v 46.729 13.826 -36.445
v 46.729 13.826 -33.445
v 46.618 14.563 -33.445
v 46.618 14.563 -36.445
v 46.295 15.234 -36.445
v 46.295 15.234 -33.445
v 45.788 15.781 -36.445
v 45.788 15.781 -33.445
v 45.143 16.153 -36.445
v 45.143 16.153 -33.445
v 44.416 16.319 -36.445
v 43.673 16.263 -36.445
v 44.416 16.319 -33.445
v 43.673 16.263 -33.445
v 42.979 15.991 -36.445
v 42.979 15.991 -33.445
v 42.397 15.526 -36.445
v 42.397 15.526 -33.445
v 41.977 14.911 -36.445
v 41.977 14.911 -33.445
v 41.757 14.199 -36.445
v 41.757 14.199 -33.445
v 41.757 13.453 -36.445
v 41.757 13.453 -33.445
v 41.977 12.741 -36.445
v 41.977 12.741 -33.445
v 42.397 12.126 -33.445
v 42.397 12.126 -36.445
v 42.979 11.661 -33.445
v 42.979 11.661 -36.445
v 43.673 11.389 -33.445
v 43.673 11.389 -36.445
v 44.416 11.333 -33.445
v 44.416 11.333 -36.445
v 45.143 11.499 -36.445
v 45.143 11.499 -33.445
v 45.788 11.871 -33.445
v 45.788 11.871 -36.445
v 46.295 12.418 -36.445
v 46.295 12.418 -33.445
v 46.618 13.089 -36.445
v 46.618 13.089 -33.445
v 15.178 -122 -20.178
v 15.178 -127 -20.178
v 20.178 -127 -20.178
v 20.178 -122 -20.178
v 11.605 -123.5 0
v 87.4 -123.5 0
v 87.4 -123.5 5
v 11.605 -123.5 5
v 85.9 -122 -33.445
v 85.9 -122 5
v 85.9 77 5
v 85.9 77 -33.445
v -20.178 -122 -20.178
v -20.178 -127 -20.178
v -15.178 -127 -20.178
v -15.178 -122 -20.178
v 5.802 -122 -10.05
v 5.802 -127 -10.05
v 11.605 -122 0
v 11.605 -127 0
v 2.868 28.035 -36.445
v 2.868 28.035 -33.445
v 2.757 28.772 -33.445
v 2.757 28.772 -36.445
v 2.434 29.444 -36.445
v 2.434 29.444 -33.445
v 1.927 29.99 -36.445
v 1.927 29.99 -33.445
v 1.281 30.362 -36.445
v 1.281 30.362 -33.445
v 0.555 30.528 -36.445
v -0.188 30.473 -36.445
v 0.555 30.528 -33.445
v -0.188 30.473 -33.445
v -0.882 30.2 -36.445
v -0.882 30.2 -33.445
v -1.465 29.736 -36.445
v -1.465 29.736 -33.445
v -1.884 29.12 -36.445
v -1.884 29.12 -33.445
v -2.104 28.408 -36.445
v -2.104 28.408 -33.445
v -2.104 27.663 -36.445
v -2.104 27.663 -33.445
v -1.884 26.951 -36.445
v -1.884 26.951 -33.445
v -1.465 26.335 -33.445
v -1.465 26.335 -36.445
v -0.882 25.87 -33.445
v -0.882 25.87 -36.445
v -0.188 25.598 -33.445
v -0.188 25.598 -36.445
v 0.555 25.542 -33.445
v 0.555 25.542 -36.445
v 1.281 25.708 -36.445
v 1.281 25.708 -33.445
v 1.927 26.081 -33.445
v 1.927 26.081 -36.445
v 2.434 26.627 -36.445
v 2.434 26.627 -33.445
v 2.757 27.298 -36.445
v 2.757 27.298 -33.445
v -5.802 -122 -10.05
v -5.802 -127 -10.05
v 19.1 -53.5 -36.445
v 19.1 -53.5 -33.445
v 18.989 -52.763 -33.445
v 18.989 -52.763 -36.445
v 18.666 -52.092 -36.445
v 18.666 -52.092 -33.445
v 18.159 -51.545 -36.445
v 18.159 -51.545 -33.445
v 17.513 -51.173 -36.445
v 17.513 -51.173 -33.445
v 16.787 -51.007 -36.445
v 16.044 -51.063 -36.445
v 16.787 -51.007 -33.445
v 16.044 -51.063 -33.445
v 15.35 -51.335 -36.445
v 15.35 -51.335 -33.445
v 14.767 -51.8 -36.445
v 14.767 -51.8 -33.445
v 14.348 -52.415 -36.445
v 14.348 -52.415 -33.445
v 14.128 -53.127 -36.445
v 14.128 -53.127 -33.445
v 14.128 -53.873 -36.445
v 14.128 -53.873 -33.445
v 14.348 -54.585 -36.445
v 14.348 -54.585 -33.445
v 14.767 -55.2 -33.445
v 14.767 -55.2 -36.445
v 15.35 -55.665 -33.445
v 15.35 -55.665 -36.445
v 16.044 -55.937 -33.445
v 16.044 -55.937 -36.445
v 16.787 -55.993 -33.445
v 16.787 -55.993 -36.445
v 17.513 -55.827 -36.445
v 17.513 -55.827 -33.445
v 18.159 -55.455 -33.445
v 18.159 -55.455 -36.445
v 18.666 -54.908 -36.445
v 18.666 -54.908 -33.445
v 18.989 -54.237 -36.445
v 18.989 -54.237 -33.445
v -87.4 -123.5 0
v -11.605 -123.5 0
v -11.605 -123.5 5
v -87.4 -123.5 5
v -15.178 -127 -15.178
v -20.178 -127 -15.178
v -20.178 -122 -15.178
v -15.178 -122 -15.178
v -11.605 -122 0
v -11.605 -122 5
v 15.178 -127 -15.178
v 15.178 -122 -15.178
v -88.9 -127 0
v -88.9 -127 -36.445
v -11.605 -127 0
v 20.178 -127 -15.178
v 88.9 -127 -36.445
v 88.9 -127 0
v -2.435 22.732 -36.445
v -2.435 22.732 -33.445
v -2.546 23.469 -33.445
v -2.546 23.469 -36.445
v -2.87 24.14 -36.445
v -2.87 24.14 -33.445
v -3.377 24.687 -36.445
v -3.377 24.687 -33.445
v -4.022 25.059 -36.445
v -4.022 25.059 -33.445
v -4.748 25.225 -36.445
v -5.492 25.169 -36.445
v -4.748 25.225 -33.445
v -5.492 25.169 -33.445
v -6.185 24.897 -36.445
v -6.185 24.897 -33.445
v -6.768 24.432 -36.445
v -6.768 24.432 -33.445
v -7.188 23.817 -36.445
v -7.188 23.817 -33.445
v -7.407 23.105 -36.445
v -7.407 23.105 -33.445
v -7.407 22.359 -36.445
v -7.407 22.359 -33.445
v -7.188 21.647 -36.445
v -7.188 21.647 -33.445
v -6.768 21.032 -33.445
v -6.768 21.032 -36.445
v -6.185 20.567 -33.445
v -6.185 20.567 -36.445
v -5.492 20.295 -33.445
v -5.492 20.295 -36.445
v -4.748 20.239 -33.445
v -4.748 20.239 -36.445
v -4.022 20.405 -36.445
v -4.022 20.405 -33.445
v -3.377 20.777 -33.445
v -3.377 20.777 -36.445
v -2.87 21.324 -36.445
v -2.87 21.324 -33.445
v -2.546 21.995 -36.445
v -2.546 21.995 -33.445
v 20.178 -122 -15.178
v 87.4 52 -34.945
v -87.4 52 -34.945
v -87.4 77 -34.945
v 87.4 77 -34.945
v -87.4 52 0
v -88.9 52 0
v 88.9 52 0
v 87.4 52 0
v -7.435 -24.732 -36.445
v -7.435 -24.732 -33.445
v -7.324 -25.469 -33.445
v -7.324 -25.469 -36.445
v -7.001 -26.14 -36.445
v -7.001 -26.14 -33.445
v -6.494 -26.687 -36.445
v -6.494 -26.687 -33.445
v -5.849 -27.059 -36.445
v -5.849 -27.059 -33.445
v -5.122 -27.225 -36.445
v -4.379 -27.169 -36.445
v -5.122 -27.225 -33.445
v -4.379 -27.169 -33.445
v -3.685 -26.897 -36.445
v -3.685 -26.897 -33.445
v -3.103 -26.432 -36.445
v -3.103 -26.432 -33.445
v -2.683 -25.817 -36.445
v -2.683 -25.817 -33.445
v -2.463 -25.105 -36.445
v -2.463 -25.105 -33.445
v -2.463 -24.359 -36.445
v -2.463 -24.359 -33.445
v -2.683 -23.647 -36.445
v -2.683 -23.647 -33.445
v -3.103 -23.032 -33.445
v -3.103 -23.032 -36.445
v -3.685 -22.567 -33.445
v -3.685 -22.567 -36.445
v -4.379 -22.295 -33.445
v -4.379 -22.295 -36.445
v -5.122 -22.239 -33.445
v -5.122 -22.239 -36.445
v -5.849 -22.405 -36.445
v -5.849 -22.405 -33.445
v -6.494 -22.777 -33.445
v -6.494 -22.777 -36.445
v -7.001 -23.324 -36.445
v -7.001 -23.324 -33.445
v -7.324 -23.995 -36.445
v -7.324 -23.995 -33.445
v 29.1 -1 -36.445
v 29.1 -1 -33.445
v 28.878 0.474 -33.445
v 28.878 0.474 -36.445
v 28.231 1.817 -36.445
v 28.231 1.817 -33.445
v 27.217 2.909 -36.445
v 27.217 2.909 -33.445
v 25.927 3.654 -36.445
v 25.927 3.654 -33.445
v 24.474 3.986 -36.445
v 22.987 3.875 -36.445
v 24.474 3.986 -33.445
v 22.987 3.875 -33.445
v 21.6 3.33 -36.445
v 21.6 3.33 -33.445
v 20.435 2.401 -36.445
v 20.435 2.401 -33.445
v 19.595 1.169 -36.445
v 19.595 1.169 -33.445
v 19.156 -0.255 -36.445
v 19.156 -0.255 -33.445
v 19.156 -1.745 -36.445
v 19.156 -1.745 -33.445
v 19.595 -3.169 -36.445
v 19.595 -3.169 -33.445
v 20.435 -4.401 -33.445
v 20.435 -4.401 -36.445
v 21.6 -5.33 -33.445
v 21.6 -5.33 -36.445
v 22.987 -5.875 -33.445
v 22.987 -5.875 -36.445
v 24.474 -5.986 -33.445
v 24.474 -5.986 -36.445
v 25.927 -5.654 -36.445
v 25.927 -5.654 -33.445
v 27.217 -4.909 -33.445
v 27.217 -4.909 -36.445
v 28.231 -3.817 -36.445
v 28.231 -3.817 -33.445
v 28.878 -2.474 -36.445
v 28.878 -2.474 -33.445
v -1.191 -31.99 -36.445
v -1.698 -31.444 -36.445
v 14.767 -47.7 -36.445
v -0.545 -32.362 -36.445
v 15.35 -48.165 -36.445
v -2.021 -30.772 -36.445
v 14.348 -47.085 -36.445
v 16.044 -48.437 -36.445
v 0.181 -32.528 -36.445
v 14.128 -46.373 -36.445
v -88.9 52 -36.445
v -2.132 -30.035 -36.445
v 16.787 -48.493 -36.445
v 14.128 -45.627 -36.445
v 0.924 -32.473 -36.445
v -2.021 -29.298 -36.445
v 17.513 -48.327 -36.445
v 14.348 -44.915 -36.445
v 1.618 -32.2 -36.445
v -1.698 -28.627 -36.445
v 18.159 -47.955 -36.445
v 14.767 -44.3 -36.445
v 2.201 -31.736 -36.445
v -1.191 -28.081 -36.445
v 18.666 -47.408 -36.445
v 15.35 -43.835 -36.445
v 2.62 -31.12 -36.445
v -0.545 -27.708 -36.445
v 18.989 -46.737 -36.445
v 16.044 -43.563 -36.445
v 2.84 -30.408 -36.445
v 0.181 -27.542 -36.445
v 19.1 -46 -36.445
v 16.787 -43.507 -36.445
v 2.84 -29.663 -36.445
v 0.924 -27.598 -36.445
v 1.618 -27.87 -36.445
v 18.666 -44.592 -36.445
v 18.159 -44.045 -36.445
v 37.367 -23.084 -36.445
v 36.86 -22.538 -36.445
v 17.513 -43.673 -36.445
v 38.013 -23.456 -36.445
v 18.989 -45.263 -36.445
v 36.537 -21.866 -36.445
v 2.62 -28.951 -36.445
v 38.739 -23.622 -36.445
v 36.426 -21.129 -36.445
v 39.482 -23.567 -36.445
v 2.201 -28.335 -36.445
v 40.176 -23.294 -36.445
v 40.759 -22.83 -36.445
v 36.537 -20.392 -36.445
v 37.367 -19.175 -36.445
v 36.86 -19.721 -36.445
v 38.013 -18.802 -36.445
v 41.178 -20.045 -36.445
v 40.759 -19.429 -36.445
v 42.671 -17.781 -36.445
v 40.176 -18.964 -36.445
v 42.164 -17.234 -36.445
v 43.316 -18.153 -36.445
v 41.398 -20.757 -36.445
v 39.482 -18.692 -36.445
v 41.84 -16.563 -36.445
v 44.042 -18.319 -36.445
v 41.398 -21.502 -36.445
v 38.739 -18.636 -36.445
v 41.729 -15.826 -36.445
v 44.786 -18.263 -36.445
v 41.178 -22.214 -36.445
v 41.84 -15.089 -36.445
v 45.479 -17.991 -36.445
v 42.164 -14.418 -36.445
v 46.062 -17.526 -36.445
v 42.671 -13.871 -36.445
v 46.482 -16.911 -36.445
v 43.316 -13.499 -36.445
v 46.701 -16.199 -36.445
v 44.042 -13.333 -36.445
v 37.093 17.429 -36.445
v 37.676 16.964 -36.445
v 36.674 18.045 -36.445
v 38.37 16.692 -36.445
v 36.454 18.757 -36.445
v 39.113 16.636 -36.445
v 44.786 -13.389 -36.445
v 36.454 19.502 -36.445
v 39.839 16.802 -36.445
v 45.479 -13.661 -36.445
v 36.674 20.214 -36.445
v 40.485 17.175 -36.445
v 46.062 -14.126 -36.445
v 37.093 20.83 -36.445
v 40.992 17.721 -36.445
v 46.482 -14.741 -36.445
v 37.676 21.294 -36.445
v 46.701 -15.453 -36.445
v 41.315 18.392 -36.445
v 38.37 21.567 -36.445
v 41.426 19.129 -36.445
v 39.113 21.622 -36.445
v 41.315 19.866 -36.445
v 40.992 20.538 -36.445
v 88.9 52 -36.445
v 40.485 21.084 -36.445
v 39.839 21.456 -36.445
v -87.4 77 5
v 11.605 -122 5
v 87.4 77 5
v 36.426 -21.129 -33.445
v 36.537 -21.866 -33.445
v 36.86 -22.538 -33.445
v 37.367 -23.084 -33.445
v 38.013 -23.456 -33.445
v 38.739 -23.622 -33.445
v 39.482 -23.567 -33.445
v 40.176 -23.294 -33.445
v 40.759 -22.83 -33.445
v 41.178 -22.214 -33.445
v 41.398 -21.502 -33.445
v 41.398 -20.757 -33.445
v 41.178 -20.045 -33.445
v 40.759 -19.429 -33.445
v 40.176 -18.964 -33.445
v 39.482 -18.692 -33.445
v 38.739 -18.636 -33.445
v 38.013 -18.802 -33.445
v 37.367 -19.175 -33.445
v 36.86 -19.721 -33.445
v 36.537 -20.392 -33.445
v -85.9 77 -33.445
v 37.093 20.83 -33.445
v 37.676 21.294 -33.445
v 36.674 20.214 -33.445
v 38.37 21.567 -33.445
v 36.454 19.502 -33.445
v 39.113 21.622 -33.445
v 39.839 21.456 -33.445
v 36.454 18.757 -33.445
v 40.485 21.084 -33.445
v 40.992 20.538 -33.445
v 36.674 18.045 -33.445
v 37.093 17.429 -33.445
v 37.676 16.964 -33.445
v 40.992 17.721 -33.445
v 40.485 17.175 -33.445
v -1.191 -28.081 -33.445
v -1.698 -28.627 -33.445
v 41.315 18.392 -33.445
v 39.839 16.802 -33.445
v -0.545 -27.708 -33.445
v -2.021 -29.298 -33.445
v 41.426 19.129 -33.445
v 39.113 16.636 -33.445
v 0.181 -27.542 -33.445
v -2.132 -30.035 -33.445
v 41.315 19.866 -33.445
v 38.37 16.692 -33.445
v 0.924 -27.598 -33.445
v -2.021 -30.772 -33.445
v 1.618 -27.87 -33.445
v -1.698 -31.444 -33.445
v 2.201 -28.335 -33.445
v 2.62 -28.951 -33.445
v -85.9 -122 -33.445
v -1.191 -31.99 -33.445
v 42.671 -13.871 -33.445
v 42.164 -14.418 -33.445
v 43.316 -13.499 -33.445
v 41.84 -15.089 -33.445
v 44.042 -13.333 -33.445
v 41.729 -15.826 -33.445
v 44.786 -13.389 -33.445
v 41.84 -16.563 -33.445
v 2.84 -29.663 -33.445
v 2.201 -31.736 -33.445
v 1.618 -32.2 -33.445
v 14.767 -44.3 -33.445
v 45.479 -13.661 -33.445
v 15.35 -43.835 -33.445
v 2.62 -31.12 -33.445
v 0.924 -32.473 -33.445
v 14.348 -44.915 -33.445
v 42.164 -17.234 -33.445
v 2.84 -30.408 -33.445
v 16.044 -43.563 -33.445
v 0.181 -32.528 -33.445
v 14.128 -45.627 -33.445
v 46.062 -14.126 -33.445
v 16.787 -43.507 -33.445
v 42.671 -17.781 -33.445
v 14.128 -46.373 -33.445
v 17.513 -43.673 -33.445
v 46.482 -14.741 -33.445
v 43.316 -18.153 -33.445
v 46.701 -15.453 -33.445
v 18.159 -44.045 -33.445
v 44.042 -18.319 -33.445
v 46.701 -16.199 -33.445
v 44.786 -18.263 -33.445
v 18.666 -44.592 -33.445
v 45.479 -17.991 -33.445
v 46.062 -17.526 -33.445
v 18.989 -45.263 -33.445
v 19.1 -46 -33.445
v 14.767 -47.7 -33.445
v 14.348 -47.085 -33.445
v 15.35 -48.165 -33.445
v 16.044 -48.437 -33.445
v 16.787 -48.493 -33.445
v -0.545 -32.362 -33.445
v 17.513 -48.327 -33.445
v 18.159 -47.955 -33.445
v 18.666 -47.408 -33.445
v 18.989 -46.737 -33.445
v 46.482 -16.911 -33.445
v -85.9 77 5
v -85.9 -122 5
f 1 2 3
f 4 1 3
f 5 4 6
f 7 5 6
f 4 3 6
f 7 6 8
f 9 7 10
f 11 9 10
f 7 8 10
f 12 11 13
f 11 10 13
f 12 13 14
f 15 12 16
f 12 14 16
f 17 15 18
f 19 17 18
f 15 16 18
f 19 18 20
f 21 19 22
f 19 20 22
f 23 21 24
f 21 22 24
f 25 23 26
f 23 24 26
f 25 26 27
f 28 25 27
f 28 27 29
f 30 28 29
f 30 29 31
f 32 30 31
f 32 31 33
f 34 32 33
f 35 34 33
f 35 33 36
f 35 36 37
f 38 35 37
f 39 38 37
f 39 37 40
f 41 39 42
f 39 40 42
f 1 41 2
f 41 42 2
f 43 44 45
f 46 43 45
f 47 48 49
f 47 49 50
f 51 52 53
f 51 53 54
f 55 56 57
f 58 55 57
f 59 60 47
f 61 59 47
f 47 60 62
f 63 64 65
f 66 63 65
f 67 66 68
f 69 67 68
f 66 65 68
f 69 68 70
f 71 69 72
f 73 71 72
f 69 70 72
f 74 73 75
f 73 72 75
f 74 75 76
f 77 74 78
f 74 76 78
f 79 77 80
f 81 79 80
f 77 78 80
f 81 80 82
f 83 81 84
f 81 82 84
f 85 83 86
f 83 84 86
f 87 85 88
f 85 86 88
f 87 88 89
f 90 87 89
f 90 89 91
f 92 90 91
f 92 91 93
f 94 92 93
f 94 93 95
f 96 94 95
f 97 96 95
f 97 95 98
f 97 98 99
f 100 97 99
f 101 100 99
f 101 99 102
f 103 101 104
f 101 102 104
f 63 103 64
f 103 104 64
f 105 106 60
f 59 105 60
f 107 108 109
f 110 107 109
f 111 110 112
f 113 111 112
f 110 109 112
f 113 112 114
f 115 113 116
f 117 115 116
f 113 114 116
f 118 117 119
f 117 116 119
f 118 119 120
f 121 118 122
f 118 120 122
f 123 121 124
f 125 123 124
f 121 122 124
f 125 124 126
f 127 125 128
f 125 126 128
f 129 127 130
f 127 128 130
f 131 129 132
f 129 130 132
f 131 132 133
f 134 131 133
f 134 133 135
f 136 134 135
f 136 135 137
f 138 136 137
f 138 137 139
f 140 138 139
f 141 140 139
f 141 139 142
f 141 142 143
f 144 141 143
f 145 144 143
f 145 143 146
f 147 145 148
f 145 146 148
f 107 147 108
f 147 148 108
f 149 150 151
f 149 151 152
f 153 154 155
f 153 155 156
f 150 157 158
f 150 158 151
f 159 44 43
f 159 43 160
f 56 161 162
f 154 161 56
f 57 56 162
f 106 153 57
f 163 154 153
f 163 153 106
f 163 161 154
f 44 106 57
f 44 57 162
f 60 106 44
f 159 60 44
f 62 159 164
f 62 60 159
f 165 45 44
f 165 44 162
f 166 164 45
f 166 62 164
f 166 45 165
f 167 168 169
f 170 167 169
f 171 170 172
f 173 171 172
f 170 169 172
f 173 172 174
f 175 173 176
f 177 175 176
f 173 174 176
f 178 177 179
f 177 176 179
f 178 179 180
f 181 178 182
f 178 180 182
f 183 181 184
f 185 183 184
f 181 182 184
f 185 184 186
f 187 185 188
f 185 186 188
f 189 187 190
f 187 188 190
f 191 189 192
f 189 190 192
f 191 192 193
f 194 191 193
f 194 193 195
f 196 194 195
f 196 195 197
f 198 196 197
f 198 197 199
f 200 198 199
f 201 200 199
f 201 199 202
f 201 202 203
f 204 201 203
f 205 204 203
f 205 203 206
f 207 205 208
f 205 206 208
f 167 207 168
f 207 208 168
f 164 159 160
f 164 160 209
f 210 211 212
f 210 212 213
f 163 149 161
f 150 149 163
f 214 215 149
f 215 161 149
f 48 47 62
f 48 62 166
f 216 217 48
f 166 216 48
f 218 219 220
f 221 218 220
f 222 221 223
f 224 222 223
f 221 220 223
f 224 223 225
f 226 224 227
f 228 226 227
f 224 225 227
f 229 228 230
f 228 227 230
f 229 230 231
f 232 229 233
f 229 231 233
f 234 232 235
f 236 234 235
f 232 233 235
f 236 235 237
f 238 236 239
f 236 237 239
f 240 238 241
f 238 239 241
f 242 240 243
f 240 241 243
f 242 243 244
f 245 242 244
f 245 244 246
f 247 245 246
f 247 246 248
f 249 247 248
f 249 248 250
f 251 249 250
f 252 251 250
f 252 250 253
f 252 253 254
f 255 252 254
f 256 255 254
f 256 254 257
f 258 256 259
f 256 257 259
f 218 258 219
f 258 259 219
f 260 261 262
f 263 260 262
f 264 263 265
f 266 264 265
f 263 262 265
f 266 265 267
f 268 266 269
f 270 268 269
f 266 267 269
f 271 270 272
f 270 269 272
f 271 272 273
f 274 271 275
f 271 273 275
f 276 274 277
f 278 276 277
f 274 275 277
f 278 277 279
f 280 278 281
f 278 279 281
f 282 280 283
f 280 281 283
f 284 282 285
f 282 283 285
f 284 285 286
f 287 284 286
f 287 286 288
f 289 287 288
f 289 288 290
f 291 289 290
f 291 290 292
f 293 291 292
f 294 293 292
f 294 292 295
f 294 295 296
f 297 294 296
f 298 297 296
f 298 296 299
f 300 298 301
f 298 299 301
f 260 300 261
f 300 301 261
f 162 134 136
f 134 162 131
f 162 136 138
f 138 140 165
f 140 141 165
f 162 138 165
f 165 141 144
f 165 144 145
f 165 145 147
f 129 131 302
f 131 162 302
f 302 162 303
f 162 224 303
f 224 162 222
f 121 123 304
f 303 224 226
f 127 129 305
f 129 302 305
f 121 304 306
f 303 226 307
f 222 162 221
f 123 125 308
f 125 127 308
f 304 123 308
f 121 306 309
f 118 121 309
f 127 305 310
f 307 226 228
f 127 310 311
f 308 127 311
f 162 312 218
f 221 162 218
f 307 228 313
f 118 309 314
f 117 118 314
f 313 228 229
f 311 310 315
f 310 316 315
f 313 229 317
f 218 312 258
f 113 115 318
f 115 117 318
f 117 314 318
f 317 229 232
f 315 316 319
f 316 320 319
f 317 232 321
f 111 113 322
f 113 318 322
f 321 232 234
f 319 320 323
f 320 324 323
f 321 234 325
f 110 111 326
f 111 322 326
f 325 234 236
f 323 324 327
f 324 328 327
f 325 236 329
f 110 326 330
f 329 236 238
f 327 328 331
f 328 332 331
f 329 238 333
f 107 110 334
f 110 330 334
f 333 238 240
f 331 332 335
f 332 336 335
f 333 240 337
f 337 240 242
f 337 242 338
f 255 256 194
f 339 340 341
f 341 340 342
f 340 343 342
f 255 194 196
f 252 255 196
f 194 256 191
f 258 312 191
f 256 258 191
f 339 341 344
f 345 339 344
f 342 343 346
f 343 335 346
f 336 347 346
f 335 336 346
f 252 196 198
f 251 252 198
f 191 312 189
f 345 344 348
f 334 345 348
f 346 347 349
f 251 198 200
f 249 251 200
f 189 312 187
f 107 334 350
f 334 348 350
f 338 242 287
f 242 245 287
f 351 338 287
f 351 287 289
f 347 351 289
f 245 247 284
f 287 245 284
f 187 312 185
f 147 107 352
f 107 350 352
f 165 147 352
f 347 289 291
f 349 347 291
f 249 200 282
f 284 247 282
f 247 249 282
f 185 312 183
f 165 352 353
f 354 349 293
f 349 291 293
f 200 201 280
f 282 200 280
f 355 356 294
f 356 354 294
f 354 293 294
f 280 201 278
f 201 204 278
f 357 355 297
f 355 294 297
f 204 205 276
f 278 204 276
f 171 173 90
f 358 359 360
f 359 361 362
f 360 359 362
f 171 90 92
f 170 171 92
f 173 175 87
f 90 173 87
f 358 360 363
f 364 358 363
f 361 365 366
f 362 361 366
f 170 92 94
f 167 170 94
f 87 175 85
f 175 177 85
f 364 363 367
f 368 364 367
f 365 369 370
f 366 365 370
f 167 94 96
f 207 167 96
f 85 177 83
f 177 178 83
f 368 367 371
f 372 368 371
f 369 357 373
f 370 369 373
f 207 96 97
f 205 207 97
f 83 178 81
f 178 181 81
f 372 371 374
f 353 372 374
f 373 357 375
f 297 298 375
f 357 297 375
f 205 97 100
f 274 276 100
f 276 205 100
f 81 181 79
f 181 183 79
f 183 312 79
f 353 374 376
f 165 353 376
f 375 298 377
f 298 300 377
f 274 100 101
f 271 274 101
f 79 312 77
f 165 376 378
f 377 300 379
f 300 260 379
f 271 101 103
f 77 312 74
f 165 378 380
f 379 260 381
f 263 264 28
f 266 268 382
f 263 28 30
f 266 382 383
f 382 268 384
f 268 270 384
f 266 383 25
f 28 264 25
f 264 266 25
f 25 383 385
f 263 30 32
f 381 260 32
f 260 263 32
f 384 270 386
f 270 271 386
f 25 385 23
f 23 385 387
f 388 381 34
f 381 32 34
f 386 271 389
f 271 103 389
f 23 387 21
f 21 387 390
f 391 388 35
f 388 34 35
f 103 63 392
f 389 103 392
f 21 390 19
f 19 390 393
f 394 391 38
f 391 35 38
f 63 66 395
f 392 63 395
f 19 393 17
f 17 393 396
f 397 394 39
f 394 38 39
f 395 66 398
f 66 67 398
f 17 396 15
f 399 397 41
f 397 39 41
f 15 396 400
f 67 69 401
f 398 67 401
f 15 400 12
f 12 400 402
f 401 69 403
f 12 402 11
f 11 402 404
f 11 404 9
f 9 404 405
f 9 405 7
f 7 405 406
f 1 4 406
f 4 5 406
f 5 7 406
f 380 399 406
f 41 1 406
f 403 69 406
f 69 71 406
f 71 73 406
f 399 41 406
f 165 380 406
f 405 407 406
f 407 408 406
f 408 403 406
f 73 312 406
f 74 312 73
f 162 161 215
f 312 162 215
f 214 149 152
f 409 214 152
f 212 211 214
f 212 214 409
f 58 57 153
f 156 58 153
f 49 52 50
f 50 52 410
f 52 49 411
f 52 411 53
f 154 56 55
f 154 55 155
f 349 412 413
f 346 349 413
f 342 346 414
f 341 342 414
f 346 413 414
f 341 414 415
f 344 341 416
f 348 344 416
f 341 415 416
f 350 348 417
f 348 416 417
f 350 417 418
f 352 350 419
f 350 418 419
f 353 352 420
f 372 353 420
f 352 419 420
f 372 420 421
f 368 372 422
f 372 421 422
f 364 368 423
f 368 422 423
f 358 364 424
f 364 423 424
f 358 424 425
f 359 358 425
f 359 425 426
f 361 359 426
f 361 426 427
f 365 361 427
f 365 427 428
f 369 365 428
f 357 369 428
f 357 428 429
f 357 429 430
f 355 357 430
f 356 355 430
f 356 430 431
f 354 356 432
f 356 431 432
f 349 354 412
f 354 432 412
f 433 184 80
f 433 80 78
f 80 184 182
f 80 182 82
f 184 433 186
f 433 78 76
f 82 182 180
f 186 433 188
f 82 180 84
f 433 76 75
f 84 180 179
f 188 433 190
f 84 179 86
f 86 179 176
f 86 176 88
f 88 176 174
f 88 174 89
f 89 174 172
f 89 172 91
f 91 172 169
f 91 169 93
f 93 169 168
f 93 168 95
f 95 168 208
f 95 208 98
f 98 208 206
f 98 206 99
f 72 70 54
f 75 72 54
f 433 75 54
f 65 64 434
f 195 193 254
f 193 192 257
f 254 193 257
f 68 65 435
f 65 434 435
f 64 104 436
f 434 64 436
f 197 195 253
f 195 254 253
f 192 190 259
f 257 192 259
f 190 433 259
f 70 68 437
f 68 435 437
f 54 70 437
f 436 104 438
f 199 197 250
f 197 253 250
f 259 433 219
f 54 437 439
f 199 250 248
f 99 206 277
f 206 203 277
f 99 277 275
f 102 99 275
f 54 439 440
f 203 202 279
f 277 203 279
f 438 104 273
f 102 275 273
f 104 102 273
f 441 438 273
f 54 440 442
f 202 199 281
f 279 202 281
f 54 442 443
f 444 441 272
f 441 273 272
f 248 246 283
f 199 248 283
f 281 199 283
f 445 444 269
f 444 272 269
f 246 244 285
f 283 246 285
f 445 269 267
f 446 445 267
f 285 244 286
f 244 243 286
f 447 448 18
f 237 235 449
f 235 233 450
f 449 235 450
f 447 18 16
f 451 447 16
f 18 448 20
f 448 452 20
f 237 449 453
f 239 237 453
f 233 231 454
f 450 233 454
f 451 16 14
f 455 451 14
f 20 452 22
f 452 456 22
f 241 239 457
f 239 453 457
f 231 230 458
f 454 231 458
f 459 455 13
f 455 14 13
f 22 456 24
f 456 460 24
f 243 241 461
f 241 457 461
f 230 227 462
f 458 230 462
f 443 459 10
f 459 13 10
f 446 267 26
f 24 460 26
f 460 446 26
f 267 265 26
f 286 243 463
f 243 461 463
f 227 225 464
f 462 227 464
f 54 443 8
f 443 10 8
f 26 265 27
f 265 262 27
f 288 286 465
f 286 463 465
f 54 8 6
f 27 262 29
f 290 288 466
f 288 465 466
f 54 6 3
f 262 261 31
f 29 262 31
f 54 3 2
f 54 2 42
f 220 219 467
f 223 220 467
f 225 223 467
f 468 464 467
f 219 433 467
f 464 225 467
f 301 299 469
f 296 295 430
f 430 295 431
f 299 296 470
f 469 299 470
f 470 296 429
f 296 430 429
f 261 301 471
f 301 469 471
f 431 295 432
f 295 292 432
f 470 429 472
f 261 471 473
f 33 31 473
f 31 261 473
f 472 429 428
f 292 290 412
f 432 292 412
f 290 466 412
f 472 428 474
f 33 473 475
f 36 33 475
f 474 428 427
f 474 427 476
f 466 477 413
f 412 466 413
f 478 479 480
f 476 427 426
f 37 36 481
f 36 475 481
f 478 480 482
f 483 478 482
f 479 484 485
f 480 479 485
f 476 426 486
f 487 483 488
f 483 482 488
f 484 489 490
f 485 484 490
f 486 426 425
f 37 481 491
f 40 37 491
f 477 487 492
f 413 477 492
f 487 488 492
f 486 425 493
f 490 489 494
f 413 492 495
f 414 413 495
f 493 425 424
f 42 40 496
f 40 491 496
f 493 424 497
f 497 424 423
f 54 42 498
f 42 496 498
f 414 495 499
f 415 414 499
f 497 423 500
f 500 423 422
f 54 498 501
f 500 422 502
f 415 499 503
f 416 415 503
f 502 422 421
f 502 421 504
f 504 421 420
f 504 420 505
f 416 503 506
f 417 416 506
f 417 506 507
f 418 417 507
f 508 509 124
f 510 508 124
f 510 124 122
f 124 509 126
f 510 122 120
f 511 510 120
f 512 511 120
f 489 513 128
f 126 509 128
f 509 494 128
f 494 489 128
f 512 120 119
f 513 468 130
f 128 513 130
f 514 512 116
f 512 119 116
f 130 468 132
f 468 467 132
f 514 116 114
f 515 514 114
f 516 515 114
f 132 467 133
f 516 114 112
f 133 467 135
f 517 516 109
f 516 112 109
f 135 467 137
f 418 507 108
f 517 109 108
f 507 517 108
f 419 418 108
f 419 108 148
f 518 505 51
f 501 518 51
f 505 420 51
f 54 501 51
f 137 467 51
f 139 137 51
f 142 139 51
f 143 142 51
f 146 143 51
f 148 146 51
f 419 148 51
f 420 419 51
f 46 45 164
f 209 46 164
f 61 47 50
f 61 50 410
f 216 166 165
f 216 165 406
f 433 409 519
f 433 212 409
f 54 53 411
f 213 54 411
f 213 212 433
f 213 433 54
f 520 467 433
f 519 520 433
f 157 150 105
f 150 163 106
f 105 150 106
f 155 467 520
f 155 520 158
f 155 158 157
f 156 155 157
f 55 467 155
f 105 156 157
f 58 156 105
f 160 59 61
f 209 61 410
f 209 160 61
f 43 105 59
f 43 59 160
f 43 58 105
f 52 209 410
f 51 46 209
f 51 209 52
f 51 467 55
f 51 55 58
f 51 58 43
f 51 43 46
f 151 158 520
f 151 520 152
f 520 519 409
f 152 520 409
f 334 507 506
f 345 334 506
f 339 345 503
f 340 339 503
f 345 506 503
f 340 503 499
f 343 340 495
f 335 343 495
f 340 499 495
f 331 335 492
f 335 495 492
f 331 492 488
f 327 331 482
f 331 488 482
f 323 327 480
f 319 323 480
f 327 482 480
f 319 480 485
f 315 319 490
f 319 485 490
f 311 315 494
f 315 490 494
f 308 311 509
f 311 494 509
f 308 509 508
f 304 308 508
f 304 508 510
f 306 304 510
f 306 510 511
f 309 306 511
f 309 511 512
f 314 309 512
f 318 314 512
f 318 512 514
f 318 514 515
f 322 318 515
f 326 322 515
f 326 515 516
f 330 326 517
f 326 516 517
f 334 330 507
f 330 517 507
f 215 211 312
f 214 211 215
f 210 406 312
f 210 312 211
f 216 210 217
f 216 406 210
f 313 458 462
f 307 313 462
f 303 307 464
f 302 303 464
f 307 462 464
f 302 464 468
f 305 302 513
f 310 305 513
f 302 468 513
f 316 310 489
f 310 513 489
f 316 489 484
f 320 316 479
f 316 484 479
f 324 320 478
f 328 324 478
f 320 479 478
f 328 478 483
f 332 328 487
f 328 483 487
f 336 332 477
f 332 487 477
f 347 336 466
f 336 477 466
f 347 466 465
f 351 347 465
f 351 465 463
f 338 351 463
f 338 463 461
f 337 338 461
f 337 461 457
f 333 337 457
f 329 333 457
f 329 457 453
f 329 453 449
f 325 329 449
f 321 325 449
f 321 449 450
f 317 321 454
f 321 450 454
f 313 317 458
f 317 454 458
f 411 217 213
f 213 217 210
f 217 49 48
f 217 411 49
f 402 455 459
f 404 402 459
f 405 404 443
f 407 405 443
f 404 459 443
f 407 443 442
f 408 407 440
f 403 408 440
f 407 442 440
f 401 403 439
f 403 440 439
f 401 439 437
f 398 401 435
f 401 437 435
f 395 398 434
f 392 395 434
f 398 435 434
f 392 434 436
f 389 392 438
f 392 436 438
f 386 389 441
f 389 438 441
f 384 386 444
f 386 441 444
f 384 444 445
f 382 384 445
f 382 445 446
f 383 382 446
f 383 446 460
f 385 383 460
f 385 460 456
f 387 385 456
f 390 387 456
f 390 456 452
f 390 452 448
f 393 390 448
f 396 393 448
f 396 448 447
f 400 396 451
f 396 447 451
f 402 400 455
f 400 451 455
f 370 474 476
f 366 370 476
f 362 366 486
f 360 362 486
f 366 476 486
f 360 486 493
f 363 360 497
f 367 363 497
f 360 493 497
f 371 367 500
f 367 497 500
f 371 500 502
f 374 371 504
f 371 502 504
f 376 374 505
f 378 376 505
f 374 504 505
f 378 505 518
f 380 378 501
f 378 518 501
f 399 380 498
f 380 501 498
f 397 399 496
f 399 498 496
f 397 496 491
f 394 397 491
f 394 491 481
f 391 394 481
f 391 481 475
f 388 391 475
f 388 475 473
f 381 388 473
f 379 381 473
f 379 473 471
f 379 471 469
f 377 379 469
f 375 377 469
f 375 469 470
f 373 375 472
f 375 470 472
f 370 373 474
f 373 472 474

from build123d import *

# Parameters (mm, degrees)
SKETCH1_W           = 177.8
SKETCH1_H           = 254
BOSS_EXTRUDE1_DEPTH = 36.445
SHELL1_T            = 3
SKETCH2_R           = 22
CUT_EXTRUDE1_DEPTH  = 3
SKETCH3_R           = 5
SKETCH3_R_2         = 2.5
CUT_EXTRUDE2_DEPTH  = 3
SKETCH12_W          = 12
SKETCH12_H          = 66.89
BOSS_EXTRUDE5_DEPTH = 8
SKETCH10_R          = 3
CUT_EXTRUDE8_DEPTH  = 8
SKETCH13_W          = 174.8
SKETCH13_H          = 69.89
SKETCH13_W_2        = 171.8
SKETCH13_H_2        = 66.89
BOSS_EXTRUDE6_DEPTH = 25
SKETCH14_W          = 175.3
SKETCH14_H          = 70.39
SKETCH14_W_2        = 171.8
SKETCH14_H_2        = 66.89
CUT_EXTRUDE9_DEPTH  = 10
SKETCH17_W          = 171.8
SKETCH17_H          = 66.89
BOSS_EXTRUDE7_DEPTH = 2
SKETCH15_W          = 5
SKETCH15_H          = 5
CUT_EXTRUDE10_DEPTH = 5
BOSS_EXTRUDE8_DEPTH = 5


with BuildPart() as part:
    # Sketch1 → Boss-Extrude1 (new, symmetric)
    with BuildSketch(Plane.XY):
        Rectangle(SKETCH1_W, SKETCH1_H)
    extrude(amount=BOSS_EXTRUDE1_DEPTH, both=True)

    # Shell1 (no face opened: a closed hollow body)
    add(offset(amount=-SHELL1_T, mode=Mode.PRIVATE), mode=Mode.SUBTRACT)

    # Sketch2 → Cut-Extrude1 (cut)
    with BuildSketch(Plane(origin=(0, 0, 33.445), x_dir=(-1, 0, 0), z_dir=(0, 0, -1))):
        with Locations((0, -4)):
            Circle(SKETCH2_R)
    extrude(amount=-CUT_EXTRUDE1_DEPTH, mode=Mode.SUBTRACT)

    # Sketch3 → Cut-Extrude2 (cut)
    with BuildSketch(Plane.XY.offset(-33.445)):
        with Locations((24.1, -1)):
            Circle(SKETCH3_R)
        with Locations((44.229314747, 13.826013888)):
            Circle(SKETCH3_R_2)
        with Locations((38.926013888, 19.129314747)):
            Circle(SKETCH3_R_2)
        with Locations(Location((38.926013888, -21.129314747, 0), (0, 0, 180))):
            Circle(SKETCH3_R_2)
        with Locations(Location((44.229314747, -15.826013888, 0), (0, 0, 180))):
            Circle(SKETCH3_R_2)
        with Locations((0.36806178, 28.035239078)):
            Circle(SKETCH3_R_2)
        with Locations((-4.935239078, 22.73193822)):
            Circle(SKETCH3_R_2)
        with Locations(Location((-4.935239078, -24.73193822, 0), (0, 0, 180))):
            Circle(SKETCH3_R_2)
        with Locations(Location((0.36806178, -30.035239078, 0), (0, 0, 180))):
            Circle(SKETCH3_R_2)
        with Locations((16.6, -46)):
            Circle(SKETCH3_R_2)
        with Locations((16.6, -53.5)):
            Circle(SKETCH3_R_2)
    extrude(amount=-CUT_EXTRUDE2_DEPTH, mode=Mode.SUBTRACT)

    # Sketch12 → Boss-Extrude5 (add)
    with BuildSketch(Plane.XZ.offset(-124)):
        Rectangle(SKETCH12_W, SKETCH12_H)
    extrude(amount=BOSS_EXTRUDE5_DEPTH)

    # Sketch10 → Cut-Extrude8 (cut)
    with BuildSketch(Plane(origin=(0, 127, 0), x_dir=(1, 0, 0), z_dir=(0, 1, 0))):
        with Locations(Location((0, 0, 0), (0, 0, 270))):
            Circle(SKETCH10_R)
    extrude(amount=-CUT_EXTRUDE8_DEPTH, mode=Mode.SUBTRACT)


with BuildPart() as body_2:
    # Split2: the piece on the far side of the plane
    add(part.part)
    split(bisect_by=Plane.ZX.offset(52), keep=Keep.BOTTOM)

    # Sketch13 → Boss-Extrude6 (add)
    with BuildSketch(Plane(origin=(0, 52, 0), x_dir=(1, 0, 0), z_dir=(0, 1, 0))):
        Rectangle(SKETCH13_W, SKETCH13_H)
        Rectangle(SKETCH13_W_2, SKETCH13_H_2, mode=Mode.SUBTRACT)
    extrude(amount=BOSS_EXTRUDE6_DEPTH)

    # Sketch17 → Boss-Extrude7 (add)
    with BuildSketch(Plane(origin=(0, -124, 0), x_dir=(1, 0, 0), z_dir=(0, 1, 0))):
        Rectangle(SKETCH17_W, SKETCH17_H)
    extrude(amount=BOSS_EXTRUDE7_DEPTH)

    # Sketch15 → Cut-Extrude10 (cut)
    with BuildSketch(Plane.XZ.offset(127)):
        Polygon((11.604740411, 0), (5.802370205, 10.05), (-5.802370205, 10.05), (-11.604740411, 0), (-5.802370205, -10.05), (5.802370205, -10.05), align=None)
        with Locations((-17.67766953, 17.67766953)):
            Rectangle(SKETCH15_W, SKETCH15_H)
        with Locations((17.67766953, 17.67766953)):
            Rectangle(SKETCH15_W, SKETCH15_H)
        with Locations((17.67766953, -17.67766953)):
            Rectangle(SKETCH15_W, SKETCH15_H)
        with Locations((-17.67766953, -17.67766953)):
            Rectangle(SKETCH15_W, SKETCH15_H)
    extrude(amount=-CUT_EXTRUDE10_DEPTH, mode=Mode.SUBTRACT)


with BuildPart() as part_1:
    add(part.part)

    # Split2
    split(bisect_by=Plane.ZX.offset(52), keep=Keep.TOP)

    # Sketch14 → Cut-Extrude9 (cut)
    with BuildSketch(Plane.XZ.offset(-52)):
        Rectangle(SKETCH14_W, SKETCH14_H)
        Rectangle(SKETCH14_W_2, SKETCH14_H_2, mode=Mode.SUBTRACT)
    extrude(amount=-CUT_EXTRUDE9_DEPTH, mode=Mode.SUBTRACT)


with BuildPart() as body_3:
    # Split3: the piece on the far side of the plane
    add(body_2.part)
    split(bisect_by=Plane.XY, keep=Keep.BOTTOM)

    # Sketch19 → Boss-Extrude8 (add)
    with BuildSketch(Plane.XY):
        Polygon((-87.4, 77), (-85.9, 77), (-85.9, 75.5), (-85.9, -122), (-11.604740411, -122), (-11.604740411, -123.5), (-87.4, -123.5), align=None)
        Polygon((87.4, 77), (87.4, -123.5), (11.604740411, -123.5), (11.604740411, -122), (85.9, -122), (85.9, 75.5), (85.9, 77), align=None)
    extrude(amount=BOSS_EXTRUDE8_DEPTH)


with BuildPart() as body_2_1:
    add(body_2.part)

    # Split3
    split(bisect_by=Plane.XY, keep=Keep.TOP)


solid = body_3.part
